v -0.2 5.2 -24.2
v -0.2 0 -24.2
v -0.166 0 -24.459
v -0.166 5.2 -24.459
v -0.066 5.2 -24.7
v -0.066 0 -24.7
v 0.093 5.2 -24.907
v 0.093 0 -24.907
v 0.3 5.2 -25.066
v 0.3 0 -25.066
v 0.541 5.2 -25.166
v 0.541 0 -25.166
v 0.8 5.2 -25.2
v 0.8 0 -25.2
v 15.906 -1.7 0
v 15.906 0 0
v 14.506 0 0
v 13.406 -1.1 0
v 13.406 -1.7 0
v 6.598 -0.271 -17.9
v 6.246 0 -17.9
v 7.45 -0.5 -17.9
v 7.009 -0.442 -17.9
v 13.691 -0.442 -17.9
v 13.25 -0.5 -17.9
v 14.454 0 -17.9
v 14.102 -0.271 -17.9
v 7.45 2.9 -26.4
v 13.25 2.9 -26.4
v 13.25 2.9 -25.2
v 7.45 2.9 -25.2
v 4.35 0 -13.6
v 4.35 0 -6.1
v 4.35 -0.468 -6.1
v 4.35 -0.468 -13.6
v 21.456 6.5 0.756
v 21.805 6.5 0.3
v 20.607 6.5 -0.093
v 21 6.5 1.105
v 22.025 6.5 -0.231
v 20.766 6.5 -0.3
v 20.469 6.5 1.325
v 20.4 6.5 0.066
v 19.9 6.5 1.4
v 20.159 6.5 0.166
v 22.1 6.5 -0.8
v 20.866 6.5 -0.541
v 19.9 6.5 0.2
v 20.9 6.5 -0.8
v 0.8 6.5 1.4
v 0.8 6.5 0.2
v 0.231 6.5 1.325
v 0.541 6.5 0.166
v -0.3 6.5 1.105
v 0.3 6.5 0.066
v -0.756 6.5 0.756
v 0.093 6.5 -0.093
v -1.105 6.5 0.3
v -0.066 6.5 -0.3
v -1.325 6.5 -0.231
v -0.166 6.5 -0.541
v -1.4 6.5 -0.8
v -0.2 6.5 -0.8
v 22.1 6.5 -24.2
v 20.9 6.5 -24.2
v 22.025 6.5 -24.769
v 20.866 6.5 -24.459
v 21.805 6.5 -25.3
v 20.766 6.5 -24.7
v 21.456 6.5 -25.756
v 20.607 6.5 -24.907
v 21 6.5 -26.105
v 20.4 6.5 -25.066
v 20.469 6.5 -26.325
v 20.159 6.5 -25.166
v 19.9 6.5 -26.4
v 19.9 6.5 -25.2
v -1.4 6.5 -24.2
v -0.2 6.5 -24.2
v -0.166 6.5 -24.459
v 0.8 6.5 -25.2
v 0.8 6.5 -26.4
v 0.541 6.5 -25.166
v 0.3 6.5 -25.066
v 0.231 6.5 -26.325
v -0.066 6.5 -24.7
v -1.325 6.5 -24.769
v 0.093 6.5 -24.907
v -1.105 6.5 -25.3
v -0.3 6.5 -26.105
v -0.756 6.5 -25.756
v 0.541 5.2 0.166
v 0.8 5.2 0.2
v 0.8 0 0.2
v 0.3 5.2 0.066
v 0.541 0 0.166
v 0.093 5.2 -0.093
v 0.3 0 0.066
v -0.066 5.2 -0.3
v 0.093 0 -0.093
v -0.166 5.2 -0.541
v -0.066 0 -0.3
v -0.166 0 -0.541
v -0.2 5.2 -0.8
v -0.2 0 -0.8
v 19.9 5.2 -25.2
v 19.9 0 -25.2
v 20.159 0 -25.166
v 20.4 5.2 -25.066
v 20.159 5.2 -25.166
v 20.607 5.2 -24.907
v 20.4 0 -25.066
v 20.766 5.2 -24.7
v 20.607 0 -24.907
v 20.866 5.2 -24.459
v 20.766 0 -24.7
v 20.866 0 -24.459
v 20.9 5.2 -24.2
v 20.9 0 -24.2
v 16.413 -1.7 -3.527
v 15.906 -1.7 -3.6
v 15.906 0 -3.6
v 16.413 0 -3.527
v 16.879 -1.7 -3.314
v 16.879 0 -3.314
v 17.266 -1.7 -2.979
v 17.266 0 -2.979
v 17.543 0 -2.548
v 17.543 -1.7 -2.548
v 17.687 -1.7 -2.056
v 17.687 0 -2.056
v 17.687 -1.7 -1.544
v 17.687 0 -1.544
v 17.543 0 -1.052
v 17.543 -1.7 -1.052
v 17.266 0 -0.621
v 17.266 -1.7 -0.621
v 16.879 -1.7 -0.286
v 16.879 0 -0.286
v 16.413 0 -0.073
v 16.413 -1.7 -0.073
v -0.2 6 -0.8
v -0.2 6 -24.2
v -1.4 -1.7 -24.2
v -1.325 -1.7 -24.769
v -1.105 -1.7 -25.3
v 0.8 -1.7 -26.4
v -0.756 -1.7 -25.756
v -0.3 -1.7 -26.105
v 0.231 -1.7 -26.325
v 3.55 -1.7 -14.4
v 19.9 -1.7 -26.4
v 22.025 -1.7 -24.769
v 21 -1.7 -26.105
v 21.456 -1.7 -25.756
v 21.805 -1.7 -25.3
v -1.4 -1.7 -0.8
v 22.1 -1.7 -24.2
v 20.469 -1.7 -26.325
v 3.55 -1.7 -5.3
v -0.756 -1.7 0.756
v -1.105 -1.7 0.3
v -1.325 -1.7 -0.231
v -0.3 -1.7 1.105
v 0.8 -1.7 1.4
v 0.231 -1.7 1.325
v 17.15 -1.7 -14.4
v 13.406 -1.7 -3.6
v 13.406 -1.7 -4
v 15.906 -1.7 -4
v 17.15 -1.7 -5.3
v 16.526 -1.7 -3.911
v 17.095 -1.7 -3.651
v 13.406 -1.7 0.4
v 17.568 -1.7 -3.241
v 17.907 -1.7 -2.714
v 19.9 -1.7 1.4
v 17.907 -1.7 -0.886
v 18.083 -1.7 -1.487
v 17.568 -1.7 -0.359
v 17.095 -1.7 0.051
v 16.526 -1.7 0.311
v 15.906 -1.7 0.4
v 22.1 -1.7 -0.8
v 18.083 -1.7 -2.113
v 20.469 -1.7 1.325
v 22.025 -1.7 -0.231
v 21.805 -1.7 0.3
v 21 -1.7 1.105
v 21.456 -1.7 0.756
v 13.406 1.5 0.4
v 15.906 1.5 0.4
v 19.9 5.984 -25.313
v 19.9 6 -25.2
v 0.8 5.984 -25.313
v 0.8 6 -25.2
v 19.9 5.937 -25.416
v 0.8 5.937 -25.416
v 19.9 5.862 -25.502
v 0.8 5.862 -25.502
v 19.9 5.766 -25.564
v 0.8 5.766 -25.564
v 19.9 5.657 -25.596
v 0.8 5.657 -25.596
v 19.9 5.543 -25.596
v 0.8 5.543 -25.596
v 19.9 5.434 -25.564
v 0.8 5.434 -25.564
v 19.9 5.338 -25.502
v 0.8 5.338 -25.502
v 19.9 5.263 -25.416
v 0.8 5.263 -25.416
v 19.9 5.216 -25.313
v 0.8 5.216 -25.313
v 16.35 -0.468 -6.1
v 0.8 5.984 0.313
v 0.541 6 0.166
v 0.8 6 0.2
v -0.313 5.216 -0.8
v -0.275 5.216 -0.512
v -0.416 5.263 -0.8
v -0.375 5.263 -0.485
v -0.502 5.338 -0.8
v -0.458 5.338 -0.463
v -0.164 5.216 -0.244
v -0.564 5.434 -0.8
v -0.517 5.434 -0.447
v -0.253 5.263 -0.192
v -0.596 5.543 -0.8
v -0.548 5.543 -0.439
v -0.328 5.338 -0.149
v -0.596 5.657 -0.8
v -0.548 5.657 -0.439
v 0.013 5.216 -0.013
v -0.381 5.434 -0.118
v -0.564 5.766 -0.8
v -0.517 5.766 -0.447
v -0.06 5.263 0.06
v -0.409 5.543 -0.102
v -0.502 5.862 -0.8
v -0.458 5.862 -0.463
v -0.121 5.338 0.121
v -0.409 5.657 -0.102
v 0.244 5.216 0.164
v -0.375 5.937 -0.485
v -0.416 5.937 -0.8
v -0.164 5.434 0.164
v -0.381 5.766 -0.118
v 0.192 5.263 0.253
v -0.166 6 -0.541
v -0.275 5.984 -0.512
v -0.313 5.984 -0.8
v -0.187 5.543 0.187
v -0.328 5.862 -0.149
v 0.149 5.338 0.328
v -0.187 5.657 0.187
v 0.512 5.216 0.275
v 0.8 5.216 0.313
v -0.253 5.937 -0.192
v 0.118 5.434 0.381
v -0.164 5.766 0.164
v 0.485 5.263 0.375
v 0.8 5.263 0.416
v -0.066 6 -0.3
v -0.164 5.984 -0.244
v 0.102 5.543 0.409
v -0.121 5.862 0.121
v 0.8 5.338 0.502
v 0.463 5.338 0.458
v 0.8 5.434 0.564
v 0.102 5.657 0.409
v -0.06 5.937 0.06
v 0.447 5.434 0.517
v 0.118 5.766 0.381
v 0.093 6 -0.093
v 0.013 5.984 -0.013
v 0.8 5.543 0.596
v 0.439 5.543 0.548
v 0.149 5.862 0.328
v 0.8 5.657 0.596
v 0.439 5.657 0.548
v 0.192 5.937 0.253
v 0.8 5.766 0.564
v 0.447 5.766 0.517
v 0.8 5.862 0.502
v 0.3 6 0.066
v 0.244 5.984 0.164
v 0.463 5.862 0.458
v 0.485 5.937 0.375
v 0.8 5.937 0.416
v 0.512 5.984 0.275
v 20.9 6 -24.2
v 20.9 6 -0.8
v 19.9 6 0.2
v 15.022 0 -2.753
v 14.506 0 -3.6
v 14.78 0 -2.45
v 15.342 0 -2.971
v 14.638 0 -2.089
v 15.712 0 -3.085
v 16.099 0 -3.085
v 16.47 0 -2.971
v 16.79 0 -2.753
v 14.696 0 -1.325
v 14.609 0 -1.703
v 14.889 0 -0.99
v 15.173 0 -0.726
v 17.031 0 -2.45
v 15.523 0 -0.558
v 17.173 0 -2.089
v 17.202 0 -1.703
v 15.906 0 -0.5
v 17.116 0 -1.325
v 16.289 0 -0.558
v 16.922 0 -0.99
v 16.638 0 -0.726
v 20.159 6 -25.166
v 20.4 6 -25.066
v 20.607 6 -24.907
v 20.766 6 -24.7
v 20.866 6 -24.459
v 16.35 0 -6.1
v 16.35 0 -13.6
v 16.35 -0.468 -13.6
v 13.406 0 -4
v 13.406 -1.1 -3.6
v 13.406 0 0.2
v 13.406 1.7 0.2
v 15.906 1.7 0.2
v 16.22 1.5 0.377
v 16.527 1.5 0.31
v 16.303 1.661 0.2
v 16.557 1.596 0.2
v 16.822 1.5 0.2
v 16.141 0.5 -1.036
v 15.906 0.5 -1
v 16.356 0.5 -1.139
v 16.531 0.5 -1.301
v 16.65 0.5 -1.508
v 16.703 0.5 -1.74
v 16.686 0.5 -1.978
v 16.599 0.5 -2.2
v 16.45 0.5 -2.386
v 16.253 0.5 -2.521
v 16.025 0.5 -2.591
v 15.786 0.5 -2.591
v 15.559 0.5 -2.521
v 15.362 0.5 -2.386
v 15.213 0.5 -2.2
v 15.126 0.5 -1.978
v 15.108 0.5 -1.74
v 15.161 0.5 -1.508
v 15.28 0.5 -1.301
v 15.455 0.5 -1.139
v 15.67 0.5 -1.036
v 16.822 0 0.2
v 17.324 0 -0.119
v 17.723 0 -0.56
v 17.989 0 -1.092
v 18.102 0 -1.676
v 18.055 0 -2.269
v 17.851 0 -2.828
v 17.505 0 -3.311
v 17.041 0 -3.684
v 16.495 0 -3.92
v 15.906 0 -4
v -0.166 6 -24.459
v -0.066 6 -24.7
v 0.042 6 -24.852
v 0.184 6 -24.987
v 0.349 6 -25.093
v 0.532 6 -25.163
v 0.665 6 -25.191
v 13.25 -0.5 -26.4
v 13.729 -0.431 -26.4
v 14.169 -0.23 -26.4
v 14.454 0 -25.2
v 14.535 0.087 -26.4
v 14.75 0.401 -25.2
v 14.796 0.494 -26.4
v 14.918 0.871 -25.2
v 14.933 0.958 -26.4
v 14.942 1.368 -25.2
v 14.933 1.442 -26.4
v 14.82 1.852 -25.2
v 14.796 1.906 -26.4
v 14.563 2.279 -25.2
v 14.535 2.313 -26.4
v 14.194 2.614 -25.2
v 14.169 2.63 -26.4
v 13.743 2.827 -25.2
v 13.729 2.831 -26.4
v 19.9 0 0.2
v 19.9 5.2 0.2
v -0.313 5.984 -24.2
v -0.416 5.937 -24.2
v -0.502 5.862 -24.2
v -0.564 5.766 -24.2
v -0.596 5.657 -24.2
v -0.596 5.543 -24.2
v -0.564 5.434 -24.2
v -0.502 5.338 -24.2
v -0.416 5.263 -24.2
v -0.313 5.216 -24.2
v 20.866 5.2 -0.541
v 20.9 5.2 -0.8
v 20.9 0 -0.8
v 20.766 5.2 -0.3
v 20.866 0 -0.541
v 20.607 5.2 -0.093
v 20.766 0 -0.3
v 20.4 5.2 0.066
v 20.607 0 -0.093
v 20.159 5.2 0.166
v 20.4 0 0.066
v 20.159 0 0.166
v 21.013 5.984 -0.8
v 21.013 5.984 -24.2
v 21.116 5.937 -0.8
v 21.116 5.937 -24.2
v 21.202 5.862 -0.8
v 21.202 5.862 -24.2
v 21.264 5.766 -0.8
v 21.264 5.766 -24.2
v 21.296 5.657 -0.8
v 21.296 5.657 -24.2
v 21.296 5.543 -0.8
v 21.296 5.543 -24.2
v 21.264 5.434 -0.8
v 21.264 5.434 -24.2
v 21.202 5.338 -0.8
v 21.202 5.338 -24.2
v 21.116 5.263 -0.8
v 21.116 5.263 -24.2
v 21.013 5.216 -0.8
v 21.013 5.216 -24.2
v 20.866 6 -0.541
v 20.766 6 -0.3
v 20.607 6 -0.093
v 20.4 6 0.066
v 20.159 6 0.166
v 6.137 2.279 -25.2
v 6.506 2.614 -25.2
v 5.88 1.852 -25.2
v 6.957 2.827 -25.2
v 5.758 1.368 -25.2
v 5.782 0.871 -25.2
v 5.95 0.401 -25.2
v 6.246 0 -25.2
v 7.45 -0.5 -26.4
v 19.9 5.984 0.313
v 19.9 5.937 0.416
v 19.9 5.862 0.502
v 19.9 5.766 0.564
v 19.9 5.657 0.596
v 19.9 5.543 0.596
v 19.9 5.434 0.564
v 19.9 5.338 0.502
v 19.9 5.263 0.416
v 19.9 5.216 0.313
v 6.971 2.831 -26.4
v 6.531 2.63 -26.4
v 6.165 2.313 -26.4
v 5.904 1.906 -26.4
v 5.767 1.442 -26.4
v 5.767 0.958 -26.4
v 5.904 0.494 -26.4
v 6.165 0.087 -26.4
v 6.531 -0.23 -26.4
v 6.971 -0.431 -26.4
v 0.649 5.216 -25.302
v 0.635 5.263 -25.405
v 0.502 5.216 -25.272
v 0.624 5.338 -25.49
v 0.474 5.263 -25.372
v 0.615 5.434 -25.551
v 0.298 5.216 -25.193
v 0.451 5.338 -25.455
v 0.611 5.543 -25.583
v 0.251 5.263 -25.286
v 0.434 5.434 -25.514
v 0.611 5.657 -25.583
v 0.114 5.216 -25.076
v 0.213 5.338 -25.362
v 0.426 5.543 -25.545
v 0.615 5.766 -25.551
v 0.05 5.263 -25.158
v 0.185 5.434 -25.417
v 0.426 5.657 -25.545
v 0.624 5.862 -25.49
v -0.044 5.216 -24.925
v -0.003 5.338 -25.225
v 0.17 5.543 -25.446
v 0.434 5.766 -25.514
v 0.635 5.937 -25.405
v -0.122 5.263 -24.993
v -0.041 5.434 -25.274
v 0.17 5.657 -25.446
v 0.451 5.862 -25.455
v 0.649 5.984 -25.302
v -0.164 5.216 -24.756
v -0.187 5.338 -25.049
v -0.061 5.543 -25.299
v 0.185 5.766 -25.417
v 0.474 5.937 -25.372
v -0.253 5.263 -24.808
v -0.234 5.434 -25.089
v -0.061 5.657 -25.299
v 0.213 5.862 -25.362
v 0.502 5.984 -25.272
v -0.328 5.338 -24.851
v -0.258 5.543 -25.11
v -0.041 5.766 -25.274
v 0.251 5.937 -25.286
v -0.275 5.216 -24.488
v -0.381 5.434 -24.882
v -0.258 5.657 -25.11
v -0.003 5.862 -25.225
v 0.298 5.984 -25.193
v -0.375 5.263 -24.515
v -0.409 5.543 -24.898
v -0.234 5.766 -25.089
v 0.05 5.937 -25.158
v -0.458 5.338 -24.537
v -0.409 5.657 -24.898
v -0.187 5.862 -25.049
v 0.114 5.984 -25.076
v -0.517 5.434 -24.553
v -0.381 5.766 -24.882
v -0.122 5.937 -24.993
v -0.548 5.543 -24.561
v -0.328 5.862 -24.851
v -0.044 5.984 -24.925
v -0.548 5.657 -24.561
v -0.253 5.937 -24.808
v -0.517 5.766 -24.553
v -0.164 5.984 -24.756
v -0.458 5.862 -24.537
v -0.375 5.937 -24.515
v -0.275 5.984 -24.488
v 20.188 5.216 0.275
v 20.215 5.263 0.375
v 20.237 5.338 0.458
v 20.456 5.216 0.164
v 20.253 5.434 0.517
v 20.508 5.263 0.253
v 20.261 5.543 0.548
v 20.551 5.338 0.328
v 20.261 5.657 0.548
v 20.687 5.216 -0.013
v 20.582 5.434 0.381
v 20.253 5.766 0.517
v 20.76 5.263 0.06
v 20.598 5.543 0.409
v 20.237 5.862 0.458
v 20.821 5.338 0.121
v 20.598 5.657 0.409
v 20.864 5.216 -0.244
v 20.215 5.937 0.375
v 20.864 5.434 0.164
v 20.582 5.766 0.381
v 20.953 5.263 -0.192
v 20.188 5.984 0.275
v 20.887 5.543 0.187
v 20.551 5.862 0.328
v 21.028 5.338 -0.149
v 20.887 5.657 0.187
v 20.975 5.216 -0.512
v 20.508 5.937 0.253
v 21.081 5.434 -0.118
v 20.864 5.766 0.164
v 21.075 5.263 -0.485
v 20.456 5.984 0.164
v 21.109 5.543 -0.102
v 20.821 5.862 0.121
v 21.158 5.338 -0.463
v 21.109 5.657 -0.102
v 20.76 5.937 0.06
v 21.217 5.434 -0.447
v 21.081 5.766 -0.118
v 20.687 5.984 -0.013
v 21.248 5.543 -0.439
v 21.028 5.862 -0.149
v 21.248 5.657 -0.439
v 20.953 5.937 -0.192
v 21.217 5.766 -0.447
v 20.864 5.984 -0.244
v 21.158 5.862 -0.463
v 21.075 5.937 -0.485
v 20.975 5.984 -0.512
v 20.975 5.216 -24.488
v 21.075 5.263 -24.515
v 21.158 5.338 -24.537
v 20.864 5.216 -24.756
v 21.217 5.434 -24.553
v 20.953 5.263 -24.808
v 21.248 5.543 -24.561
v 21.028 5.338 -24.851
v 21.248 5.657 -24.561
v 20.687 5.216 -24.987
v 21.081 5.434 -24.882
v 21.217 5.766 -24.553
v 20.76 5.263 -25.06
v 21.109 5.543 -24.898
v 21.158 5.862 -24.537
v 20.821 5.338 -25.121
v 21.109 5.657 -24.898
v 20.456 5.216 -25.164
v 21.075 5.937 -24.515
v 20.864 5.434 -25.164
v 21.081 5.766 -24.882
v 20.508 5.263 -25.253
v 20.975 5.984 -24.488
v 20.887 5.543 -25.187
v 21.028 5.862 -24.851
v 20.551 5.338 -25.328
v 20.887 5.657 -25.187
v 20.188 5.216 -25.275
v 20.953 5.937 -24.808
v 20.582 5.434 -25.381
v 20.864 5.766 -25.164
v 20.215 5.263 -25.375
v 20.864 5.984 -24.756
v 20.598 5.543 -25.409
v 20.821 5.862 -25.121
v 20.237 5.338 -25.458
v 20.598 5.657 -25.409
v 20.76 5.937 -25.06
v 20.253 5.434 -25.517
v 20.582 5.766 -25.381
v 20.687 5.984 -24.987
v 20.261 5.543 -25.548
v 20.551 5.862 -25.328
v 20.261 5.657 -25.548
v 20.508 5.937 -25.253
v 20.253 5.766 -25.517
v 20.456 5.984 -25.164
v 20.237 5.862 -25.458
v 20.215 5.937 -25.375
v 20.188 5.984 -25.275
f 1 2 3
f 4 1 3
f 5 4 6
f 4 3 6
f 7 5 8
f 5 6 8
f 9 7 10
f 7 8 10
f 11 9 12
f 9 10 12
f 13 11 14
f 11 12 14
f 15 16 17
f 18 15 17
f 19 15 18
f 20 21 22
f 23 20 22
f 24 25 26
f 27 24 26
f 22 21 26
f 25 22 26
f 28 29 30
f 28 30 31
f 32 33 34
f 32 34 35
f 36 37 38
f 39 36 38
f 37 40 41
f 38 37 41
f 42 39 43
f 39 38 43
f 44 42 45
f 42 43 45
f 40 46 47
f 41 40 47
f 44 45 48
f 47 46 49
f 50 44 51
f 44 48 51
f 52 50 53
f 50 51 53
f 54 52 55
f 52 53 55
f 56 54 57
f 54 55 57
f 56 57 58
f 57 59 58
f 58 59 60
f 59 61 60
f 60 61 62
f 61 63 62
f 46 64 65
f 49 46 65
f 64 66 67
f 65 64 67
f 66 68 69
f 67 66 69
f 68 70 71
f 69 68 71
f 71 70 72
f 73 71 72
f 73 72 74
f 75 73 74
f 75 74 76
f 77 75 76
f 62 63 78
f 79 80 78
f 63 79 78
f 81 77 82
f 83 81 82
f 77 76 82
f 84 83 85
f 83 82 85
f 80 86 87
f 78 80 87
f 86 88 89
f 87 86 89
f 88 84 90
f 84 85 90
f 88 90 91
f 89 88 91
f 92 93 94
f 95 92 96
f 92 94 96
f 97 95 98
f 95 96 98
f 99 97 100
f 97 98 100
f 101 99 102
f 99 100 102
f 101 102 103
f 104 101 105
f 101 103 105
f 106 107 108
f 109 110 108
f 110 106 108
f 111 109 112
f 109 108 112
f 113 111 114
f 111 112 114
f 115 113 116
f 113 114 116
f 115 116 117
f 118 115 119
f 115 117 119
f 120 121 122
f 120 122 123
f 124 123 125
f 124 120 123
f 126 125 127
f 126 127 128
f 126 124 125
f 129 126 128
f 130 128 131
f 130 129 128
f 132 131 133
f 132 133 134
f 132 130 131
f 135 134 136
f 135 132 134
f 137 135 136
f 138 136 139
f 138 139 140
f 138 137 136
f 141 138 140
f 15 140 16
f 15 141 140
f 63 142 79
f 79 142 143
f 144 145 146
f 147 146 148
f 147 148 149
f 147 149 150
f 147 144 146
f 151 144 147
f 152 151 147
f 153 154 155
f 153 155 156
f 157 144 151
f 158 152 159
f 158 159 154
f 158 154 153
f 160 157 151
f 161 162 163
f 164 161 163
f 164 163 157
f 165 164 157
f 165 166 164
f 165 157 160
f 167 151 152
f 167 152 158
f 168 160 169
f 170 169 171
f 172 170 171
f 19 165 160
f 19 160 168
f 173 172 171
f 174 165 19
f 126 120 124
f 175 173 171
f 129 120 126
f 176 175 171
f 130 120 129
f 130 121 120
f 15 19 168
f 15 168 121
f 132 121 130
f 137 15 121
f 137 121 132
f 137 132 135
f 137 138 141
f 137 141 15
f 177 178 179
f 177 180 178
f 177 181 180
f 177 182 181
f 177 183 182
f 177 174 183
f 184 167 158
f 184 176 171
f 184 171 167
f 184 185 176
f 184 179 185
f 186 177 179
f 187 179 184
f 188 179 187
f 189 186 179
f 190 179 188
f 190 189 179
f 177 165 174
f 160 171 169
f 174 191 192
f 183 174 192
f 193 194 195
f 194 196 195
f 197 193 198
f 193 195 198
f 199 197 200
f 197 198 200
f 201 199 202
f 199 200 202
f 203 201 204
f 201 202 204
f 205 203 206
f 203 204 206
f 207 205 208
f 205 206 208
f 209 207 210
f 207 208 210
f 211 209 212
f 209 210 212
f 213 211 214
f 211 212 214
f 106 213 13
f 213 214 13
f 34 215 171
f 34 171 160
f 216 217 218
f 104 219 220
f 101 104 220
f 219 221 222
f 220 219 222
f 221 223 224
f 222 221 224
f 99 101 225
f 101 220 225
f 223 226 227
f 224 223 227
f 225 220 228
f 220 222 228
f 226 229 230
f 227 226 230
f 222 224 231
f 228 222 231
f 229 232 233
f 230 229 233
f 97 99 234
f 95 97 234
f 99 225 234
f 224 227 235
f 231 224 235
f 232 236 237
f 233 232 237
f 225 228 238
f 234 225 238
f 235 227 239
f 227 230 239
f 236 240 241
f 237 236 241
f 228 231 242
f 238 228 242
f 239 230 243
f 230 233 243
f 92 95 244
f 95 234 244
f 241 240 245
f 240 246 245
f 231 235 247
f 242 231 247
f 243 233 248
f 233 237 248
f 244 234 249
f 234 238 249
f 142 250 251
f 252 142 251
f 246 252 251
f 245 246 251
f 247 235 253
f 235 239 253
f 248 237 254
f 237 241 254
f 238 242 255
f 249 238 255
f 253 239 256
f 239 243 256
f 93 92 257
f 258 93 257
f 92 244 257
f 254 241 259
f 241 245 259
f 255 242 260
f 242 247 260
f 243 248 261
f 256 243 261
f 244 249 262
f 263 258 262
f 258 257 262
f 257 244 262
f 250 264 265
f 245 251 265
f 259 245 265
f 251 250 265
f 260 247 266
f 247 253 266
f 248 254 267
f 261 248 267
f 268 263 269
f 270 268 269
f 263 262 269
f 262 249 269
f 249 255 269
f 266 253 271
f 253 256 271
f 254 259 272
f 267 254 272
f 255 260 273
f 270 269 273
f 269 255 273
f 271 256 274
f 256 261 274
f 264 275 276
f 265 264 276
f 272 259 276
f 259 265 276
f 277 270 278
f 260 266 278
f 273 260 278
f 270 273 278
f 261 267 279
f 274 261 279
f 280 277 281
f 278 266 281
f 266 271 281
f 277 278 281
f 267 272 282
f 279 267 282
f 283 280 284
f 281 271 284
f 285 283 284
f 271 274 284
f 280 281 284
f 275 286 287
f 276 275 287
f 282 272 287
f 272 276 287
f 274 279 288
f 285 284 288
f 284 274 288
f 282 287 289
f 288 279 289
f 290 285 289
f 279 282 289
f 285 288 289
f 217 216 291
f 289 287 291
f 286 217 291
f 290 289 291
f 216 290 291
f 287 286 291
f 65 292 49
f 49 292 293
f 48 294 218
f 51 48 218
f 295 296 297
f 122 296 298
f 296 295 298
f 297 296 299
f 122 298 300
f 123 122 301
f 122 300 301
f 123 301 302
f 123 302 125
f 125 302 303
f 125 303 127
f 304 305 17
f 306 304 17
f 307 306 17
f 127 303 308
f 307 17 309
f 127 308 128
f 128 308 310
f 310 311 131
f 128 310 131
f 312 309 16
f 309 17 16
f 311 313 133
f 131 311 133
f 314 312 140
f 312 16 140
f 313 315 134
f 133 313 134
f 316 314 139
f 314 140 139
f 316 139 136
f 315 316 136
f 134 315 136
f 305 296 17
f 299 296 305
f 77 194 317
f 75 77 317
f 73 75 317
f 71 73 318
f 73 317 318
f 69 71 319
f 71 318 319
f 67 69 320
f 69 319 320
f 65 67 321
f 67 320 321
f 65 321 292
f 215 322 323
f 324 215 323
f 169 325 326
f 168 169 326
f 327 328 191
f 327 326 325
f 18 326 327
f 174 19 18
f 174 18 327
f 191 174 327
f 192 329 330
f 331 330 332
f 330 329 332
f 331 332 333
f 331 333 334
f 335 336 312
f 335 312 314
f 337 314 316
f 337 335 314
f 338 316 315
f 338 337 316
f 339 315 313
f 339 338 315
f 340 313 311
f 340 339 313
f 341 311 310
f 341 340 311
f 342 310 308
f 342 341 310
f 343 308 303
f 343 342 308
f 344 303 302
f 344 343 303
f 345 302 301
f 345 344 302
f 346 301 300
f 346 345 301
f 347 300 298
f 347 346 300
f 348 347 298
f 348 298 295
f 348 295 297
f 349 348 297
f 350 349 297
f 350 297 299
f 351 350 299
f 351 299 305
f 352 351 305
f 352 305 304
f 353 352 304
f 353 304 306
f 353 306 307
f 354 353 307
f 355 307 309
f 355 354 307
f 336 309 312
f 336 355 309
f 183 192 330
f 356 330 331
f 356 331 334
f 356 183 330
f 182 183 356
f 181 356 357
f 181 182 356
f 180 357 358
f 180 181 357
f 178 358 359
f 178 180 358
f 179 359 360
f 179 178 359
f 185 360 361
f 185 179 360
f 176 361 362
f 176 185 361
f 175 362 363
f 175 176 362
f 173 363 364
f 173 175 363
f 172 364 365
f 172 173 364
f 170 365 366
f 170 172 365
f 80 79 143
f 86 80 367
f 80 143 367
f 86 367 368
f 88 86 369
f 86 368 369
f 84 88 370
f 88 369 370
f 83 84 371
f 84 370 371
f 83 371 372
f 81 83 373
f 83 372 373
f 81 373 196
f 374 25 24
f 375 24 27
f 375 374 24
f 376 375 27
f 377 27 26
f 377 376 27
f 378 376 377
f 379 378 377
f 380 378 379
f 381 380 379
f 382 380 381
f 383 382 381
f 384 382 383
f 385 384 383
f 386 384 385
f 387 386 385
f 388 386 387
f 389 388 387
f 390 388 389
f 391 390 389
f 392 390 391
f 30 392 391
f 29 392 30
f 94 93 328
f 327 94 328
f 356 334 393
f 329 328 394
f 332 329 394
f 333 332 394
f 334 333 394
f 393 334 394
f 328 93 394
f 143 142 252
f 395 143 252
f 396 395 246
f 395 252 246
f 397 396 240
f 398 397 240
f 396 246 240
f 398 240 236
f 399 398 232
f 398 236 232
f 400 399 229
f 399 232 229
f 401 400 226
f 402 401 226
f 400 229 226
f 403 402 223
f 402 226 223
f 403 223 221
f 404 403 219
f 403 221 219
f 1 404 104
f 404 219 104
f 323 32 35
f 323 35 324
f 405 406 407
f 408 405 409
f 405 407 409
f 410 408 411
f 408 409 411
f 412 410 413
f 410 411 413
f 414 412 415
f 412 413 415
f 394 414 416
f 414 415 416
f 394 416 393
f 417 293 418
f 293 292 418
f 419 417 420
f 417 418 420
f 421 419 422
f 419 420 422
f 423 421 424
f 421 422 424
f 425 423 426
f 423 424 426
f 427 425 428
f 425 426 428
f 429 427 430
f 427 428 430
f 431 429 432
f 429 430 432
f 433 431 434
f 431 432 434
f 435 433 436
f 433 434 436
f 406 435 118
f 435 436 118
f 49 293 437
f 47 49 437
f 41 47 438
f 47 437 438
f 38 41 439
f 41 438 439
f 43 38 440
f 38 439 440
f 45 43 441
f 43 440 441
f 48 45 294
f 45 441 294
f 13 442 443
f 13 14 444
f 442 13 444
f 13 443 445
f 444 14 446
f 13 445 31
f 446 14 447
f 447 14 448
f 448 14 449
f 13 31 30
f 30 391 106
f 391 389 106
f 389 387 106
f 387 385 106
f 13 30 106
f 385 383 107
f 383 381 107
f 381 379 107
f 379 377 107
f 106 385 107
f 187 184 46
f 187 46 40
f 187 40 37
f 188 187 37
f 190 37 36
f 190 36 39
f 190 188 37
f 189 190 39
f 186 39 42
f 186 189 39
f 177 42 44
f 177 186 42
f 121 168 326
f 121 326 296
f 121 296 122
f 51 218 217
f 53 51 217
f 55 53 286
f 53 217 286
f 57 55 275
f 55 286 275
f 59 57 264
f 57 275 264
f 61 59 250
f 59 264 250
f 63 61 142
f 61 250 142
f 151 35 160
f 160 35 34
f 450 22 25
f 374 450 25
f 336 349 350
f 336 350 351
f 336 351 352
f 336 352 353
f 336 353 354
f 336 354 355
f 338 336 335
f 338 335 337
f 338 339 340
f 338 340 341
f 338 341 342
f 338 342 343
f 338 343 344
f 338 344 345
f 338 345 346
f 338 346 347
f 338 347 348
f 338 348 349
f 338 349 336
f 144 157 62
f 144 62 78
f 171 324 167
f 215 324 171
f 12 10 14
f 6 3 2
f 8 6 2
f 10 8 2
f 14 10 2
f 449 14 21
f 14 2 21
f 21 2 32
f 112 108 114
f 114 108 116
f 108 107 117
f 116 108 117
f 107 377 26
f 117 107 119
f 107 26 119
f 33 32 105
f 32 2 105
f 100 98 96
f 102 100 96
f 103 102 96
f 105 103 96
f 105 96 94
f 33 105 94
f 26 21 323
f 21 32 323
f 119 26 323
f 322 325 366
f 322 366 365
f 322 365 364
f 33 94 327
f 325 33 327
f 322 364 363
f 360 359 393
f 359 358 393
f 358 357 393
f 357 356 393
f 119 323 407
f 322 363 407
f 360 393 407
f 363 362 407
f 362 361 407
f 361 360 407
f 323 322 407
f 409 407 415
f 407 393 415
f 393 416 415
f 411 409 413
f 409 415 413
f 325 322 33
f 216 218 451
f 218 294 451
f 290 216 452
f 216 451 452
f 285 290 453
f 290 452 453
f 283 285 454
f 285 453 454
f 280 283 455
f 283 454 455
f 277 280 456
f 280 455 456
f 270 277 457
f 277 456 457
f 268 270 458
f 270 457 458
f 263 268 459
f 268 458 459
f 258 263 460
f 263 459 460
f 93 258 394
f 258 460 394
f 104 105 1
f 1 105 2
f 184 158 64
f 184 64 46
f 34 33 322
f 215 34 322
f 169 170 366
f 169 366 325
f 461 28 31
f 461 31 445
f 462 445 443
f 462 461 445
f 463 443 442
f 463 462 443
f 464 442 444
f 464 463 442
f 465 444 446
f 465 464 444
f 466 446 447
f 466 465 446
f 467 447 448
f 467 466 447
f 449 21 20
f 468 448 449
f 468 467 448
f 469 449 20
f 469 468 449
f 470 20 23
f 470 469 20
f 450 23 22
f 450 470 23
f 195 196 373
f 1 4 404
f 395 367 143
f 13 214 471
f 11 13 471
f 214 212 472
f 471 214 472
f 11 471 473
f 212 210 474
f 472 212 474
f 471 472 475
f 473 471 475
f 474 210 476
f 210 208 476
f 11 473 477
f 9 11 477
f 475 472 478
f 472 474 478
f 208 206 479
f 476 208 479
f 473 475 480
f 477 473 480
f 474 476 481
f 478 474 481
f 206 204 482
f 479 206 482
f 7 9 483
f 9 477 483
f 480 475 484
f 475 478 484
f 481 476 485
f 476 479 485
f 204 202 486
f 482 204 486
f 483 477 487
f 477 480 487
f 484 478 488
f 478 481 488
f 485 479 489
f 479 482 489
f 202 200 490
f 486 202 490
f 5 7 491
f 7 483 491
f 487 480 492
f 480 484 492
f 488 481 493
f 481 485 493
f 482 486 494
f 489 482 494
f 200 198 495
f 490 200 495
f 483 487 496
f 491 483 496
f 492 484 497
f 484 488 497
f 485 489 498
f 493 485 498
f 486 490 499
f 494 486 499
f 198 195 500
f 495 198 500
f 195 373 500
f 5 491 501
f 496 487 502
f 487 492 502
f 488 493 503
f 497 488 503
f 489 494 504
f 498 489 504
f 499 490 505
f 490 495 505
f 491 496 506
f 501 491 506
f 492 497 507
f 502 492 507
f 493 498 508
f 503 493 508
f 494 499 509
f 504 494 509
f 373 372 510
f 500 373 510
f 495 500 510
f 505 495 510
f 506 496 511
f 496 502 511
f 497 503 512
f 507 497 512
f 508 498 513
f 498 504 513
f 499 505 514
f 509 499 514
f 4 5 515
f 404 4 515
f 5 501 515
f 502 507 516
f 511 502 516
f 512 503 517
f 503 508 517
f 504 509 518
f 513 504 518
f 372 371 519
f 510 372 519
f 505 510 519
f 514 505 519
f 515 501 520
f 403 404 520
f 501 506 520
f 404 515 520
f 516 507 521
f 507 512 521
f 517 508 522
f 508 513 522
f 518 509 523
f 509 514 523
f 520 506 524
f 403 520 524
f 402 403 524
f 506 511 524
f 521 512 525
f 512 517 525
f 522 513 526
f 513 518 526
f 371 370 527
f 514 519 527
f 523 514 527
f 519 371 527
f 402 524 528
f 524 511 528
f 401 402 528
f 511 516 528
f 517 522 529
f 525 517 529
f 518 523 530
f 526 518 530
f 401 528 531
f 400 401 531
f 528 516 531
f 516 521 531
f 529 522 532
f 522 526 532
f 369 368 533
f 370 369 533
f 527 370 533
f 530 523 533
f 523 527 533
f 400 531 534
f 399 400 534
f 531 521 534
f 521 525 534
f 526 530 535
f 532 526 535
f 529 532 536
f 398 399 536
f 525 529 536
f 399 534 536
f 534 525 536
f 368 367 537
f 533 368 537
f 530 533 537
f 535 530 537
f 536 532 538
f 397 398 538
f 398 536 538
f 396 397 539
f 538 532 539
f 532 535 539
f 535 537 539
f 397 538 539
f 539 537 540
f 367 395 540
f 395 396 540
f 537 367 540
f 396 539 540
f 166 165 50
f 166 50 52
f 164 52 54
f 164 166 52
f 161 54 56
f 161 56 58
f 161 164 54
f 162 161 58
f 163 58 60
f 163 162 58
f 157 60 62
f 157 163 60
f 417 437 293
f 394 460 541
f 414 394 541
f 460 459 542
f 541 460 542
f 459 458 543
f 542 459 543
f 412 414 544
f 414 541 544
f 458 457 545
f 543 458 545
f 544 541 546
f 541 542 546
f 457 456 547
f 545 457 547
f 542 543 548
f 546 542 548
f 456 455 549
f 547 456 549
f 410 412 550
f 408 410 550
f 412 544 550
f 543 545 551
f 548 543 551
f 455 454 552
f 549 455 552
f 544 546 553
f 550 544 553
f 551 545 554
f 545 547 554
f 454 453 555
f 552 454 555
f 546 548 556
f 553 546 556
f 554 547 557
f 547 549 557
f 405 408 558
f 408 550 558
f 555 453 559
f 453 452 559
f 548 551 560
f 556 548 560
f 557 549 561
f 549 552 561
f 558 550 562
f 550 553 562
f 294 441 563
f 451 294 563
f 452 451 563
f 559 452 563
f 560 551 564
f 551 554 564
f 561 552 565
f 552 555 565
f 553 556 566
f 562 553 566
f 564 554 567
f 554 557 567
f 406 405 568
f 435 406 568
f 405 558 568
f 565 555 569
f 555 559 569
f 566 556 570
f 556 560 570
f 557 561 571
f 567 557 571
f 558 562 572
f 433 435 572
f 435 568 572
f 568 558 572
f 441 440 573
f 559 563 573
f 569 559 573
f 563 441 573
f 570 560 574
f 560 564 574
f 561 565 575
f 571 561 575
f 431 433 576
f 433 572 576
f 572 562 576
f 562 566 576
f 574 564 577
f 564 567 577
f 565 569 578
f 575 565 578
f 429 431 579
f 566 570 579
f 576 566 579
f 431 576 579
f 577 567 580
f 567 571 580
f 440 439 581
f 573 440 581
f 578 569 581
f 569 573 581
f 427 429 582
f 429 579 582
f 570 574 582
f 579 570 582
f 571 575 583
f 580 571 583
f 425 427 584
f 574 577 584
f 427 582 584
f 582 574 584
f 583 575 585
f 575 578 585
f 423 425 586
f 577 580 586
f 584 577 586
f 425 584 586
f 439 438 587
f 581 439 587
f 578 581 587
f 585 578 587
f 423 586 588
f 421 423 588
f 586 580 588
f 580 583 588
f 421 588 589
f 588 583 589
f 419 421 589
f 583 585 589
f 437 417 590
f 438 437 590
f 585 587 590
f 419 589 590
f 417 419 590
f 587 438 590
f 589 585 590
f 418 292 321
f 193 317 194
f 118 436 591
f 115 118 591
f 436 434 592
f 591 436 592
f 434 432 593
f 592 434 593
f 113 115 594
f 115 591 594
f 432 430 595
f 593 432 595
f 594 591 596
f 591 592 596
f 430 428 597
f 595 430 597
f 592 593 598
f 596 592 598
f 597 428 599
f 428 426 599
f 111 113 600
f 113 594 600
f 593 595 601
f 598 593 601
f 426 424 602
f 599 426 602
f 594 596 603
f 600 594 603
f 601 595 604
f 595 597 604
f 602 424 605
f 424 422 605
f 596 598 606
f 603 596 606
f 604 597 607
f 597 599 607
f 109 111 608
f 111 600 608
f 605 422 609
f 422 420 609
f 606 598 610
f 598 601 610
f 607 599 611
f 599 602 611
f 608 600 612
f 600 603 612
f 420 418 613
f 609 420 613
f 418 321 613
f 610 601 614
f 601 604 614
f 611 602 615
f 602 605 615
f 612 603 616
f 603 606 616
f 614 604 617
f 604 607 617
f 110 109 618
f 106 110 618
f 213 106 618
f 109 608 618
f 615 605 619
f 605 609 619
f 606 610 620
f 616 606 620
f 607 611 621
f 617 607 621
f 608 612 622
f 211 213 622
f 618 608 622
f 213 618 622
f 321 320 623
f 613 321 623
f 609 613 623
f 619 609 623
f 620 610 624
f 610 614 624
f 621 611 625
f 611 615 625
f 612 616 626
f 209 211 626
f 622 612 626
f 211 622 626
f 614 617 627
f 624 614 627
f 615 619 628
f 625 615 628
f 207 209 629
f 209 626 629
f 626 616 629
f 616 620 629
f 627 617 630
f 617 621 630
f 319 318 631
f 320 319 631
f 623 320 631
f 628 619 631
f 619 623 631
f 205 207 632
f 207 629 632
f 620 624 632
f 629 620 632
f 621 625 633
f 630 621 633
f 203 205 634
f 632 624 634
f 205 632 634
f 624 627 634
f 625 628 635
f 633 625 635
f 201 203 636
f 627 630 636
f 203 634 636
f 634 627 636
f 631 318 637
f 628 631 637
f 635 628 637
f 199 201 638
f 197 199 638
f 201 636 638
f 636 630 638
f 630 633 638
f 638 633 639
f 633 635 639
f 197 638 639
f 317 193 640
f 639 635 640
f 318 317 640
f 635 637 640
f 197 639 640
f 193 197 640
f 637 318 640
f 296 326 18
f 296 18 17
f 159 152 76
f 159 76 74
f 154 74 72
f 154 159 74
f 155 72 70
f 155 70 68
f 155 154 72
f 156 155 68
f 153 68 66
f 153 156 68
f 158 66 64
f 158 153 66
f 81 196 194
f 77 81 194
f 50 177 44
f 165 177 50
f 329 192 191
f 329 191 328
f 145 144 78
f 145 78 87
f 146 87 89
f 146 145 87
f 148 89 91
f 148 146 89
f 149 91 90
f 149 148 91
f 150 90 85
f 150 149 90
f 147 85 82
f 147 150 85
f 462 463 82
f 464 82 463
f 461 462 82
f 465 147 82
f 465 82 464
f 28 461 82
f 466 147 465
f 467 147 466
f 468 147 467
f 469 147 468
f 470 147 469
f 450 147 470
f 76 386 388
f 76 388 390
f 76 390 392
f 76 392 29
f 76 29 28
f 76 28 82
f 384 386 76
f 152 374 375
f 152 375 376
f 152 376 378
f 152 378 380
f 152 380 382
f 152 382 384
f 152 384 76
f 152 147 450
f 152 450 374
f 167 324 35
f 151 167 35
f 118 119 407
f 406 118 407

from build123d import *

# Parameters (mm, degrees)
BOSS_EXTRUDE7_DEPTH     = 6.5
BOSS_EXTRUDE8_START     = 1.7
BOSS_EXTRUDE8_DEPTH     = 1.7
CUT_EXTRUDE1_DEPTH      = 8.5
SKETCH6_W               = 12
SKETCH6_H               = 7.5
CUT_EXTRUDE2_DEPTH      = 8.5
CHAMFER1_SIZE           = 0.8
CHAMFER1_SIZE2          = 1.231891971
SKETCH7_R               = 0.4
CUT_EXTRUDE3_DEPTH      = 2
CUT_EXTRUDE3_DEPTH_BACK = 36.03740858
CHAMFER2_SIZE           = 0.5
CUT_EXTRUDE4_REACH      = 34.411
SKETCH12_R              = 0.8
BOSS_EXTRUDE9_DEPTH     = 0.5
CHAMFER3_SIZE           = 0.5


# Some blends are built 0.0001 mm under size
with BuildPart() as part:
    # Sketch1 → Boss-Extrude7 (new body)
    with BuildSketch(Plane(origin=(0, 0, 0), x_dir=(1, 0, 0), z_dir=(0, 1, 0))):
        with BuildLine():
            Line((0.8, 26.4), (19.9, 26.4))
            ThreePointArc((19.9, 26.4), (21.455634919, 25.755634919), (22.1, 24.2))
            Line((22.1, 24.2), (22.1, 0.8))
            ThreePointArc((22.1, 0.8), (21.455634919, -0.755634919), (19.9, -1.4))
            Line((19.9, -1.4), (0.8, -1.4))
            ThreePointArc((0.8, -1.4), (-0.755634919, -0.755634919), (-1.4, 0.8))
            Line((-1.4, 0.8), (-1.4, 24.2))
            ThreePointArc((-1.4, 24.2), (-0.755634919, 25.755634919), (0.8, 26.4))
        make_face()
        with BuildLine():
            Line((0.8, 25.2), (19.9, 25.2))
            ThreePointArc((19.9, 25.2), (20.607106781, 24.907106781), (20.9, 24.2))
            Line((20.9, 24.2), (20.9, 0.8))
            ThreePointArc((20.9, 0.8), (20.607106781, 0.092893219), (19.9, -0.2))
            Line((19.9, -0.2), (0.8, -0.2))
            ThreePointArc((0.8, -0.2), (0.092893219, 0.092893219), (-0.2, 0.8))
            Line((-0.2, 0.8), (-0.2, 24.2))
            ThreePointArc((-0.2, 24.2), (0.092893219, 24.907106781), (0.8, 25.2))
        make_face(mode=Mode.SUBTRACT)
    extrude(amount=BOSS_EXTRUDE7_DEPTH)

    # Sketch4 → Boss-Extrude8 (add)
    with BuildSketch(Plane.XZ.offset(BOSS_EXTRUDE8_START)):
        with BuildLine():
            Line((0.8, -26.4), (19.9, -26.4))
            ThreePointArc((19.9, -26.4), (21.455634919, -25.755634919), (22.1, -24.2))
            Line((22.1, -24.2), (22.1, -0.8))
            ThreePointArc((22.1, -0.8), (21.455634919, 0.755634919), (19.9, 1.4))
            Line((19.9, 1.4), (0.8, 1.4))
            ThreePointArc((0.8, 1.4), (-0.755634919, 0.755634919), (-1.4, -0.8))
            Line((-1.4, -0.8), (-1.4, -24.2))
            ThreePointArc((-1.4, -24.2), (-0.755634919, -25.755634919), (0.8, -26.4))
        make_face()
    extrude(amount=-BOSS_EXTRUDE8_DEPTH)

    # Sketch5 → Cut-Extrude1 (cut)
    with BuildSketch(Plane(origin=(0, 0, -26.4), x_dir=(-1, 0, 0), z_dir=(0, 0, -1))):
        with BuildLine():
            Line((-13.25, 2.9), (-7.45, 2.9))
            ThreePointArc((-7.45, 2.9), (-5.75, 1.2), (-7.45, -0.5))
            Line((-7.45, -0.5), (-13.25, -0.5))
            ThreePointArc((-13.25, -0.5), (-14.95, 1.2), (-13.25, 2.9))
        make_face()
    extrude(amount=-CUT_EXTRUDE1_DEPTH, mode=Mode.SUBTRACT)

    # Sketch6 → Cut-Extrude2 (cut)
    with BuildSketch(Plane(origin=(0, 0, 0), x_dir=(1, 0, 0), z_dir=(0, 1, 0))):
        with Locations((10.35, 9.85)):
            Rectangle(SKETCH6_W, SKETCH6_H)
    extrude(amount=-CUT_EXTRUDE2_DEPTH, mode=Mode.SUBTRACT)

    # Chamfer1
    chamfer1_edges = [part.edges().sort_by_distance(p)[0] for p in [
        (10.35, -1.7, -6.1),
        (16.35, -1.7, -9.85),
        (10.35, -1.7, -13.6),
        (4.35, -1.7, -9.85),
    ]]
    chamfer1_side = [part.faces().sort_by_distance(p)[0] for p in [
        (-0.498235424, -1.7, -25.498235424),
    ]]
    chamfer(chamfer1_edges, length=CHAMFER1_SIZE, length2=CHAMFER1_SIZE2, reference=chamfer1_side[0])

    # Cut-Sweep1: sweep along a path in Sketch9
    with BuildLine(Plane(origin=(0, 6.5, 0), x_dir=(1, 0, 0), z_dir=(0, 1, 0))) as cut_sweep1_path:
        Line((-1.4, 24.2), (-1.4, 0.8))
        ThreePointArc((-1.4, 0.8), (-0.755634919, -0.755634919), (0.8, -1.4))
        Line((0.8, -1.4), (19.9, -1.4))
        ThreePointArc((19.9, -1.4), (21.455634919, -0.755634919), (22.1, 0.8))
        Line((22.1, 0.8), (22.1, 24.2))
        ThreePointArc((22.1, 24.2), (21.455634919, 25.755634919), (19.9, 26.4))
        Line((19.9, 26.4), (0.8, 26.4))
        ThreePointArc((0.8, 26.4), (-0.755634919, 25.755634919), (-1.4, 24.2))
    # Sketch7 → Cut-Sweep1 (sweep, cut)
    with BuildSketch(Plane(origin=(0, 0, -16.4), x_dir=(-1, 0, 0), z_dir=(0, 0, -1))):
        with Locations((-20.9, 5.6)):
            Circle(SKETCH7_R)
    sweep(path=cut_sweep1_path.line, mode=Mode.SUBTRACT)

    # Sketch10 → Cut-Extrude3 (cut, two sides: drawn at the far end of the back side and taken through both)
    with BuildSketch(Plane(origin=(0, 0, 0), x_dir=(1, 0, 0), z_dir=(0, 1, 0)).offset(-CUT_EXTRUDE3_DEPTH_BACK)):
        with BuildLine():
            Line((15.905695732, 4), (13.405695732, 4))
            Line((13.405695732, 4), (13.405695732, 3.6))
            Line((13.405695732, 3.6), (15.905695732, 3.6))
            ThreePointArc((15.905695732, 3.6), (17.705695732, 1.8), (15.905695732, 0))
            Line((15.905695732, 0), (13.405695732, 0))
            Line((13.405695732, 0), (13.405695732, -0.4))
            Line((13.405695732, -0.4), (15.905695732, -0.4))
            ThreePointArc((15.905695732, -0.4), (18.105695732, 1.8), (15.905695732, 4))
        make_face()
    extrude(amount=CUT_EXTRUDE3_DEPTH + CUT_EXTRUDE3_DEPTH_BACK, mode=Mode.SUBTRACT)

    # Chamfer2
    # the kernel refuses this chamfer: 0.5 mm, written as the material it adds along each edge
    with BuildSketch(Plane(origin=(15.905695732, 2, -1.8), x_dir=(0, 0, 1), z_dir=(-1, 0, 0))) as chamfer2_piece_1_section:
        Polygon((2.2, -CHAMFER2_SIZE), (2.2 - CHAMFER2_SIZE, 0), (2.2, 0), align=None)
    chamfer2_piece_1 = revolve(axis=Axis((15.905695732, 2, -1.8), (0, 1, 0)), revolution_arc=58.108843161, mode=Mode.PRIVATE)
    chamfer2_piece_1 = split(chamfer2_piece_1, bisect_by=Plane(origin=(16.26277058, 1.786381102, 0.2), z_dir=(0, 0, 1)), keep=Keep.TOP, mode=Mode.PRIVATE)
    add(chamfer2_piece_1)
    with BuildSketch(Plane(origin=(12.119854238, 2, 0.4), x_dir=(0, -0.9996219169112968, 0.02749587661058638), z_dir=(1, 0, 0))) as chamfer2_piece_2_section:
        Polygon((CHAMFER2_SIZE * 0.999621916911, CHAMFER2_SIZE * 0.0274958766106), (-CHAMFER2_SIZE * 0.0274958766106, CHAMFER2_SIZE * 0.999621916911), (0, 0), align=None)
    chamfer2_piece_2 = extrude(amount=3.785841494, mode=Mode.PRIVATE)
    chamfer2_piece_2 = split(chamfer2_piece_2, bisect_by=Plane(origin=(14.374950242, 1.792648103, 0.2), z_dir=(0, 0, 1)), keep=Keep.TOP, mode=Mode.PRIVATE)
    add(chamfer2_piece_2)

    # Sketch11 → Cut-Extrude4 (cut, up to next)
    with BuildSketch(Plane(origin=(0, 0, -3.6), x_dir=(-1, 0, 0), z_dir=(0, 0, -1)), mode=Mode.PRIVATE) as cut_extrude4_sk1:
        Polygon((-13.405695732, 0), (-13.405695732, -1.1), (-14.505695732, 0), align=None)
    cut_extrude4_tool1 = extrude(cut_extrude4_sk1.sketch, amount=-CUT_EXTRUDE4_REACH, mode=Mode.PRIVATE) & part.part
    add(cut_extrude4_tool1.solids().sort_by_distance((13.772362, -0.366667, -3.6))[0], mode=Mode.SUBTRACT)

    # Sketch12 → Boss-Extrude9 (add)
    with BuildSketch(Plane(origin=(0, 0, 0), x_dir=(1, 0, 0), z_dir=(0, 1, 0))):
        with Locations(Location((15.905695732, 1.8, 0), (0, 0, 270))):
            Circle(SKETCH12_R)
    extrude(amount=BOSS_EXTRUDE9_DEPTH)

    # Chamfer3
    chamfer3_edges = [part.edges().sort_by_distance(p)[0] for p in [
        (15.905695732, 0, -2.6),
    ]]
    chamfer(chamfer3_edges, length=CHAMFER3_SIZE - 0.0001)  # a hair under: the kernel refuses the full size


solid = part.part
